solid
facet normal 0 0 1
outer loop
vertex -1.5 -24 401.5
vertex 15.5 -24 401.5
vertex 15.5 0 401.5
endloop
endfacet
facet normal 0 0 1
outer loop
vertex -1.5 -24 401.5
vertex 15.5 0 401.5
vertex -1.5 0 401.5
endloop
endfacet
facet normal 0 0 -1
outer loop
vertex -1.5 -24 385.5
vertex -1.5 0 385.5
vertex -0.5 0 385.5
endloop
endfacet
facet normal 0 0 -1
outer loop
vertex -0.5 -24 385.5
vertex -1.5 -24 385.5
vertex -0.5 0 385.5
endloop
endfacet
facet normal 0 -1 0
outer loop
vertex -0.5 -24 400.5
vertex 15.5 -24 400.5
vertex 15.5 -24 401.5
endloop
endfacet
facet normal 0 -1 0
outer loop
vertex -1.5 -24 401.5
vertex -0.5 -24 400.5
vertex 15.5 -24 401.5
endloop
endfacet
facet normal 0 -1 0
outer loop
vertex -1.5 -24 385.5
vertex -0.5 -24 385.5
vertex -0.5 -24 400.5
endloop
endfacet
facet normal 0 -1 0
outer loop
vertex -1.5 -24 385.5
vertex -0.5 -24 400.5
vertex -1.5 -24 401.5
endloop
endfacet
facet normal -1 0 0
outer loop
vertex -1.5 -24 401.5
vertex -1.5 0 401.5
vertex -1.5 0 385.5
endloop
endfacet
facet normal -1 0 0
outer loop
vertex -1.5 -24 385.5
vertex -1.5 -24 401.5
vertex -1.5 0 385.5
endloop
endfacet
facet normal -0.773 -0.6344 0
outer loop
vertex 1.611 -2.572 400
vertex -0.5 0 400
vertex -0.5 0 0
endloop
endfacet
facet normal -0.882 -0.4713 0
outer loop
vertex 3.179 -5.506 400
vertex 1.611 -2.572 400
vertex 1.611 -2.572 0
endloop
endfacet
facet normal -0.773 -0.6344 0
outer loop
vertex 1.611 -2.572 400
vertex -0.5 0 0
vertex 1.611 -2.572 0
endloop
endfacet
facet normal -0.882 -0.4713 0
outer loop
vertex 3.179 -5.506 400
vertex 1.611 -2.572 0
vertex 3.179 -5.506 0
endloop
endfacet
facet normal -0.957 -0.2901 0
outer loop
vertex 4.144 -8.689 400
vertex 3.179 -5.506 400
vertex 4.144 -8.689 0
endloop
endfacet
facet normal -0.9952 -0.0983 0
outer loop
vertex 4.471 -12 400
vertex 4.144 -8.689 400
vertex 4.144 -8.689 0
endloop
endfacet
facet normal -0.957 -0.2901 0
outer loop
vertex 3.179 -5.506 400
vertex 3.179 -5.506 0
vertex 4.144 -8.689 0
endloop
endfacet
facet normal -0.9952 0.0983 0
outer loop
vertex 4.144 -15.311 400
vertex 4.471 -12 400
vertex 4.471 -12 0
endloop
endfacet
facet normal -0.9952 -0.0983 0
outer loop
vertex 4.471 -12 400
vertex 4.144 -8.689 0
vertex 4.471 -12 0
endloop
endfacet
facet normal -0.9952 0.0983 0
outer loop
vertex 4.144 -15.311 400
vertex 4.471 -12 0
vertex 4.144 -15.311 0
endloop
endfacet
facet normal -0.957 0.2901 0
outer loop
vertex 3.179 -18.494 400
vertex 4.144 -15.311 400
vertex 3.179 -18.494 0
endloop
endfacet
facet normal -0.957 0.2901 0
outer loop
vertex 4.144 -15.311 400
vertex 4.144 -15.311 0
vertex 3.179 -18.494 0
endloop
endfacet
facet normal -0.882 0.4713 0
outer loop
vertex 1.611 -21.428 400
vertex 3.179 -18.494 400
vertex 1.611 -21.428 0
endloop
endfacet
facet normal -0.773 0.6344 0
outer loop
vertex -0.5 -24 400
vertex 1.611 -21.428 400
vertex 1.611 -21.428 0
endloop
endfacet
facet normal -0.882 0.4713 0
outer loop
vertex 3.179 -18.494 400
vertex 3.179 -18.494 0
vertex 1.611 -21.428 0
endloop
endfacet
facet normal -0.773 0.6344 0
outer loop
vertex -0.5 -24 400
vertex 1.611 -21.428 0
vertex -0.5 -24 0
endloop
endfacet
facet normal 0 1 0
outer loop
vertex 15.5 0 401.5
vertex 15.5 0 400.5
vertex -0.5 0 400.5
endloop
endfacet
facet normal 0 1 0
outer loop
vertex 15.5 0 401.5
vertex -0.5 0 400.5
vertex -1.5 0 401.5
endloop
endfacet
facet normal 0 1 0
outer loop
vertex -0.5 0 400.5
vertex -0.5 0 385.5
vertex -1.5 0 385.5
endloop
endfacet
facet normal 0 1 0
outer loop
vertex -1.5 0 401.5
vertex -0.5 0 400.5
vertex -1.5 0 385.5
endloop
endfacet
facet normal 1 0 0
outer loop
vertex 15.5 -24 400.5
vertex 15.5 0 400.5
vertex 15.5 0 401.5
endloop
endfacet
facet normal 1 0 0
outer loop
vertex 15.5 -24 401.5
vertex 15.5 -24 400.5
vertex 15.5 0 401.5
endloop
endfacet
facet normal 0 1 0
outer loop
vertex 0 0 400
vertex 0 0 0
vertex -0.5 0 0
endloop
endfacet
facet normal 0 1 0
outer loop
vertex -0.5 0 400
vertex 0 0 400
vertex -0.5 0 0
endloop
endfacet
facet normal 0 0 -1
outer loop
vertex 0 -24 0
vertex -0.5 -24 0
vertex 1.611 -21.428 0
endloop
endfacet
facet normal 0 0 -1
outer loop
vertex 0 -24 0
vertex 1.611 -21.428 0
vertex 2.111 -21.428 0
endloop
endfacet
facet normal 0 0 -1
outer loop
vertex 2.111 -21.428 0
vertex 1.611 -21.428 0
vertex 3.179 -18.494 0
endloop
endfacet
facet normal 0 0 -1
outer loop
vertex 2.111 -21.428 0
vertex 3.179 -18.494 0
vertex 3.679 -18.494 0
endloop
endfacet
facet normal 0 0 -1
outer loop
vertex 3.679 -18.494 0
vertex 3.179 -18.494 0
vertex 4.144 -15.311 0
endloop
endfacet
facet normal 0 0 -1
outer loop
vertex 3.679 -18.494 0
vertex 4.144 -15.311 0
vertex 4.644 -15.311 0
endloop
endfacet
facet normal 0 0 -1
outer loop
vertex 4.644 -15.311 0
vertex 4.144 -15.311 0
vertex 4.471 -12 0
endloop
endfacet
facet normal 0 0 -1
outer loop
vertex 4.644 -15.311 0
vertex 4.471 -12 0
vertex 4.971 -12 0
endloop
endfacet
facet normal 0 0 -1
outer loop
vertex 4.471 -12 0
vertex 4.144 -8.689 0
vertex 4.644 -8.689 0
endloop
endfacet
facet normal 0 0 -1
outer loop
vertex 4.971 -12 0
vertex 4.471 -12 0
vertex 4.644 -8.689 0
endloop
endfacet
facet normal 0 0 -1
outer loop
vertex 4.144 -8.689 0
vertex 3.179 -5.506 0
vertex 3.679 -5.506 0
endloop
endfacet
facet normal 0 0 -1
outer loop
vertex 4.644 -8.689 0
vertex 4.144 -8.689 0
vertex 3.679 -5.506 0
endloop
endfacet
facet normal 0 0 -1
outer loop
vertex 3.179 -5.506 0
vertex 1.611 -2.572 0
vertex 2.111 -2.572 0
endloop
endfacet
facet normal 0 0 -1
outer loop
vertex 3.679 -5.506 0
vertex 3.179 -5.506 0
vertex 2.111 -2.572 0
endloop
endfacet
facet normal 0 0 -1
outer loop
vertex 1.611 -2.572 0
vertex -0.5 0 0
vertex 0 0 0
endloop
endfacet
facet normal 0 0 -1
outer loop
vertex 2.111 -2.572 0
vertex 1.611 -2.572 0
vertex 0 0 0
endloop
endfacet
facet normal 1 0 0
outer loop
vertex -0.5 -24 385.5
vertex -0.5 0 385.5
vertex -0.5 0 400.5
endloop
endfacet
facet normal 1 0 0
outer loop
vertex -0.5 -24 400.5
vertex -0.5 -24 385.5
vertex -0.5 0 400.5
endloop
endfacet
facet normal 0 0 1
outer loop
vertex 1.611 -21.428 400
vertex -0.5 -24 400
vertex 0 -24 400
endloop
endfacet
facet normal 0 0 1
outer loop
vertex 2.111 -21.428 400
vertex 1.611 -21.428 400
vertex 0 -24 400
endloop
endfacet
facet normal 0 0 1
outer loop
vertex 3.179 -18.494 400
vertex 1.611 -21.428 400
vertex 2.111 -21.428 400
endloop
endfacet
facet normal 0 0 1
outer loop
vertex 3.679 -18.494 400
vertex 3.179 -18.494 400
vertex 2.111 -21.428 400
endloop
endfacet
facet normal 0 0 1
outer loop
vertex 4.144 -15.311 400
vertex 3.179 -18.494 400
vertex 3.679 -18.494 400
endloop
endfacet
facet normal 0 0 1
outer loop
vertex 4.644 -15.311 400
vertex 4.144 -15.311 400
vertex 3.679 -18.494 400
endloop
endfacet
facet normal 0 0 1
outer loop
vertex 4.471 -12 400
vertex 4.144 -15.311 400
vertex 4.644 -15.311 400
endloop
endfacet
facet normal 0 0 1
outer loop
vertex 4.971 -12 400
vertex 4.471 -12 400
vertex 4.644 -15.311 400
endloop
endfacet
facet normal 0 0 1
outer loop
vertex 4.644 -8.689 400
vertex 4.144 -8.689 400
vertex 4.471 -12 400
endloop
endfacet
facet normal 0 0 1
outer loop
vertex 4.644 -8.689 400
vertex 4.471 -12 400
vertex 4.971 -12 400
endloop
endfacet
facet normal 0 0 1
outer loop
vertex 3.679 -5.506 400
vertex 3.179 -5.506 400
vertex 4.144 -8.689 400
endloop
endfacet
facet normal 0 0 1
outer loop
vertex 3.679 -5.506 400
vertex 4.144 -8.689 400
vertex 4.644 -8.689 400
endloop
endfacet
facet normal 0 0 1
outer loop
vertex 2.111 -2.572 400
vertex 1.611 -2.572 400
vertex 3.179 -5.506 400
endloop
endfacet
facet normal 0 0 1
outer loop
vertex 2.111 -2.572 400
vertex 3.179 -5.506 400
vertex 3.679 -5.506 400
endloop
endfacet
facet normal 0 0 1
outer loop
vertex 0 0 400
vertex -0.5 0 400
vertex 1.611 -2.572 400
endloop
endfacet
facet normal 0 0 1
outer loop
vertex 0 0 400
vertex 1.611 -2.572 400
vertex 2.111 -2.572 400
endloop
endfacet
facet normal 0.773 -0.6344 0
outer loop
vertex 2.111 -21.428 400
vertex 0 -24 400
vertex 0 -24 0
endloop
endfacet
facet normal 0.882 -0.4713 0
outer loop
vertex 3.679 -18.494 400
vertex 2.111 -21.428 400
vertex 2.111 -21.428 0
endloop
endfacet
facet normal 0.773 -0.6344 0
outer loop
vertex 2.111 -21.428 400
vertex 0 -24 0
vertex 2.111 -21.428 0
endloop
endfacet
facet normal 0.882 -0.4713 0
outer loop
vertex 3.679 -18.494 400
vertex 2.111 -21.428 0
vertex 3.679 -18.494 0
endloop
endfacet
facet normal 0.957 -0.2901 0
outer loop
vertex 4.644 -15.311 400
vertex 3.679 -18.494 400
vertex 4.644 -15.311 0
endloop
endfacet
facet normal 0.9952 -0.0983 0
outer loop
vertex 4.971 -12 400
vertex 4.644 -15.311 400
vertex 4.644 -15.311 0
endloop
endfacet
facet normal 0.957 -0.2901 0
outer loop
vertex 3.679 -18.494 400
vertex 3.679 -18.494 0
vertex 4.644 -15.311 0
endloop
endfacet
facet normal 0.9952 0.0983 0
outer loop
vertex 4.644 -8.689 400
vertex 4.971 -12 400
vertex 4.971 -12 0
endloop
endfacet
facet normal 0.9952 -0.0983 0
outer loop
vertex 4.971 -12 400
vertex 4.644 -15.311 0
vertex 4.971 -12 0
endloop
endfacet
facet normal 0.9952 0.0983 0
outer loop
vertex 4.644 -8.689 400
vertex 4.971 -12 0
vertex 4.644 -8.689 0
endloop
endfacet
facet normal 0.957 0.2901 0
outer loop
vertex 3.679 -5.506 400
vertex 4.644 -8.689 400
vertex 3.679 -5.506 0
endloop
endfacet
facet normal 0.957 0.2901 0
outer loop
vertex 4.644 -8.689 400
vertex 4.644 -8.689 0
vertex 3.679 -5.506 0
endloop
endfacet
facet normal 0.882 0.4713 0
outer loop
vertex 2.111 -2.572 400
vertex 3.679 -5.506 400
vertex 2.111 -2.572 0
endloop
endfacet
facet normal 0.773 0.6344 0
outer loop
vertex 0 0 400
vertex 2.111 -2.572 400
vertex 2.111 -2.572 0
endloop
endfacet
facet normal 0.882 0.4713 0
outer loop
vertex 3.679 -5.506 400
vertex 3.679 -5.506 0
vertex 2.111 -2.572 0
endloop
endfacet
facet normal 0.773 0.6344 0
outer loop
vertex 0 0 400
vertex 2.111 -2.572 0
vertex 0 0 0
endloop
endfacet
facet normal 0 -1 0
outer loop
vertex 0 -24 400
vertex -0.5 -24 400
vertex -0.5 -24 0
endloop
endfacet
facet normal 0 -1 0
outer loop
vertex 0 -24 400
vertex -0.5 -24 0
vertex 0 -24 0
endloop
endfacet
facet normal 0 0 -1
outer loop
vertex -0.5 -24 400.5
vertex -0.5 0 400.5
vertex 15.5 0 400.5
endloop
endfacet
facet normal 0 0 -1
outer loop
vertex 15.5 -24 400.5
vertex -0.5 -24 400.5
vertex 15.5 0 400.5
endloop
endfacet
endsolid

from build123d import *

# Parameters (mm, degrees)
SALIENTE_EXTRUIR1_DEPTH = 400
SALIENTE_EXTRUIR6_DEPTH = 24


with BuildPart() as part:
    # Croquis1 → Saliente-Extruir1 (new body)
    with BuildSketch(Plane.XY):
        with BuildLine():
            Line((0, 0), (-0.5, 0))
            ThreePointArc((-0.5, 0), (4.470562748, -12), (-0.5, -24))
            Line((-0.5, -24), (0, -24))
            ThreePointArc((0, -24), (4.970562748, -12), (0, 0))
        make_face()
    extrude(amount=SALIENTE_EXTRUIR1_DEPTH)


with BuildPart() as body_2:
    # Croquis2 → Saliente-Extruir6 (new body)
    with BuildSketch(Plane(origin=(0, 0, 0), x_dir=(1, 0, 0), z_dir=(0, 1, 0))):
        Polygon((-1.5, -385.5), (-0.5, -385.5), (-0.5, -400.5), (15.5, -400.5), (15.5, -401.5), (-1.5, -401.5), align=None)
    extrude(amount=-SALIENTE_EXTRUIR6_DEPTH)


solid = Compound([part.part, body_2.part])
